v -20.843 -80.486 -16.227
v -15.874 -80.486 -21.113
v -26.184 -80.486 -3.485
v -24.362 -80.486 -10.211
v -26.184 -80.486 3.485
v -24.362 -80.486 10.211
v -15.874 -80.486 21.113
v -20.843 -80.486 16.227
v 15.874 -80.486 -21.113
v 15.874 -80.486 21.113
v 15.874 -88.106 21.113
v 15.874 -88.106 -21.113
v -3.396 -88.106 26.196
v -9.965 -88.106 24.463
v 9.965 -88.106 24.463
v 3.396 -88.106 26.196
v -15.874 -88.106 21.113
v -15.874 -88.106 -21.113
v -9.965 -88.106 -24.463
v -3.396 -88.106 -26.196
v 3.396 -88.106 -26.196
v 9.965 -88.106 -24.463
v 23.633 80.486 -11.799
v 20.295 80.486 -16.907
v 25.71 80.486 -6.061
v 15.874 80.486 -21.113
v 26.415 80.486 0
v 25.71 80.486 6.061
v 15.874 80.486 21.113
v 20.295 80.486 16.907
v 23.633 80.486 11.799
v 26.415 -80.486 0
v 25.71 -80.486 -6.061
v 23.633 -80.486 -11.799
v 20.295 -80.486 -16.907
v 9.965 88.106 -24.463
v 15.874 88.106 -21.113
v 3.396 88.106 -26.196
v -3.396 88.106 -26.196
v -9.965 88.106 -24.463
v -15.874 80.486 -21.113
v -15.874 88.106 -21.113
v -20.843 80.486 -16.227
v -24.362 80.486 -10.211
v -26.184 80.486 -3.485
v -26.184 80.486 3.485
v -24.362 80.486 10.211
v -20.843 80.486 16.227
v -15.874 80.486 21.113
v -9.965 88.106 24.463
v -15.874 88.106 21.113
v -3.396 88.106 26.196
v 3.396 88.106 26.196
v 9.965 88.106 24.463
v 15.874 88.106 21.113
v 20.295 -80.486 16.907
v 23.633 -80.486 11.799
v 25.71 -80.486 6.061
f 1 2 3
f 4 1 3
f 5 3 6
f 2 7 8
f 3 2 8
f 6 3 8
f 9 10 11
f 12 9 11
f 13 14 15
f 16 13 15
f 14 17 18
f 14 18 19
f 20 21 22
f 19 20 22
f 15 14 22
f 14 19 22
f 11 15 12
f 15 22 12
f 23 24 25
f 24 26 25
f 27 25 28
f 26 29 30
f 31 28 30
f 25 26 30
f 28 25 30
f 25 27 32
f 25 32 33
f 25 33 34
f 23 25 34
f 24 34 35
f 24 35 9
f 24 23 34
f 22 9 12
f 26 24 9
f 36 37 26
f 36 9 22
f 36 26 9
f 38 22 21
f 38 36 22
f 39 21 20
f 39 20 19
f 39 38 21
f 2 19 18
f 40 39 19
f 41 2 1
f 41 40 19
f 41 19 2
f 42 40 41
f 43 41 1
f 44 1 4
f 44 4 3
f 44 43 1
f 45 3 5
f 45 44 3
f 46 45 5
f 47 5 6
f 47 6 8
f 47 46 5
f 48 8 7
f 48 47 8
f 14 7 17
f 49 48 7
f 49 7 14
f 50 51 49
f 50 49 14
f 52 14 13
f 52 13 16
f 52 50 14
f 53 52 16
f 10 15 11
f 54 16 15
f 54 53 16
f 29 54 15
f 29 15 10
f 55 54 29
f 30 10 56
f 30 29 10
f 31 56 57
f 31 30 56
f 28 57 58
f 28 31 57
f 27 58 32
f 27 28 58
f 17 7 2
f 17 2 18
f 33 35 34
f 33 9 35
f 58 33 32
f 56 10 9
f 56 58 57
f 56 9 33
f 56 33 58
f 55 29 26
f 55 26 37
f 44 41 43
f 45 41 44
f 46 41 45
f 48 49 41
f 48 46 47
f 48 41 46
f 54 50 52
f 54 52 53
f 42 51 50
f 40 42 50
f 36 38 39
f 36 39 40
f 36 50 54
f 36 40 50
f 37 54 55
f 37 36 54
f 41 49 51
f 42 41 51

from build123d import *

# Parameters (mm, degrees)
SKETCH2_R               = 26.415
EXTRUDE1_DEPTH          = 88.10625
SKETCH3_W               = 10.541
SKETCH3_H               = 7.62
EXTRUDE2_DEPTH          = 27.415
MIRROR2_COPY_1_SKETCH_W = 10.541
MIRROR2_COPY_1_SKETCH_H = 7.62
MIRROR2_COPY_1_DEPTH    = 27.415


with BuildPart() as part:
    # Sketch2 → Extrude1 (new body, symmetric)
    with BuildSketch(Plane(origin=(0, 0, 0), x_dir=(1, 0, 0), z_dir=(0, 1, 0))):
        Circle(SKETCH2_R)
    extrude(amount=EXTRUDE1_DEPTH, both=True)

    # Sketch3 → Extrude2 (cut, symmetric)
    with BuildSketch(Plane.XY):
        with Locations((21.1445, 84.29625)):
            Rectangle(SKETCH3_W, SKETCH3_H)
    extrude2 = extrude(amount=EXTRUDE2_DEPTH, both=True, mode=Mode.SUBTRACT)

    # Mirror1: Extrude2 across plane
    add(extrude2.mirror(Plane(origin=(0, 0, 0), x_dir=(0, 0, 1), z_dir=(1, 0, 0))), mode=Mode.SUBTRACT)

    # Mirror2: Extrude2 across plane
    add(extrude2.mirror(Plane.ZX), mode=Mode.SUBTRACT)

    # Mirror2 copy 1 sketch → Mirror2 copy 1 (cut, symmetric)
    with BuildSketch(Plane(origin=(0, 0, 0), x_dir=(-1, 0, 0), z_dir=(0, 0, 1))):
        with Locations((21.1445, 84.29625)):
            Rectangle(MIRROR2_COPY_1_SKETCH_W, MIRROR2_COPY_1_SKETCH_H)
    extrude(amount=MIRROR2_COPY_1_DEPTH, both=True, mode=Mode.SUBTRACT)


solid = part.part
